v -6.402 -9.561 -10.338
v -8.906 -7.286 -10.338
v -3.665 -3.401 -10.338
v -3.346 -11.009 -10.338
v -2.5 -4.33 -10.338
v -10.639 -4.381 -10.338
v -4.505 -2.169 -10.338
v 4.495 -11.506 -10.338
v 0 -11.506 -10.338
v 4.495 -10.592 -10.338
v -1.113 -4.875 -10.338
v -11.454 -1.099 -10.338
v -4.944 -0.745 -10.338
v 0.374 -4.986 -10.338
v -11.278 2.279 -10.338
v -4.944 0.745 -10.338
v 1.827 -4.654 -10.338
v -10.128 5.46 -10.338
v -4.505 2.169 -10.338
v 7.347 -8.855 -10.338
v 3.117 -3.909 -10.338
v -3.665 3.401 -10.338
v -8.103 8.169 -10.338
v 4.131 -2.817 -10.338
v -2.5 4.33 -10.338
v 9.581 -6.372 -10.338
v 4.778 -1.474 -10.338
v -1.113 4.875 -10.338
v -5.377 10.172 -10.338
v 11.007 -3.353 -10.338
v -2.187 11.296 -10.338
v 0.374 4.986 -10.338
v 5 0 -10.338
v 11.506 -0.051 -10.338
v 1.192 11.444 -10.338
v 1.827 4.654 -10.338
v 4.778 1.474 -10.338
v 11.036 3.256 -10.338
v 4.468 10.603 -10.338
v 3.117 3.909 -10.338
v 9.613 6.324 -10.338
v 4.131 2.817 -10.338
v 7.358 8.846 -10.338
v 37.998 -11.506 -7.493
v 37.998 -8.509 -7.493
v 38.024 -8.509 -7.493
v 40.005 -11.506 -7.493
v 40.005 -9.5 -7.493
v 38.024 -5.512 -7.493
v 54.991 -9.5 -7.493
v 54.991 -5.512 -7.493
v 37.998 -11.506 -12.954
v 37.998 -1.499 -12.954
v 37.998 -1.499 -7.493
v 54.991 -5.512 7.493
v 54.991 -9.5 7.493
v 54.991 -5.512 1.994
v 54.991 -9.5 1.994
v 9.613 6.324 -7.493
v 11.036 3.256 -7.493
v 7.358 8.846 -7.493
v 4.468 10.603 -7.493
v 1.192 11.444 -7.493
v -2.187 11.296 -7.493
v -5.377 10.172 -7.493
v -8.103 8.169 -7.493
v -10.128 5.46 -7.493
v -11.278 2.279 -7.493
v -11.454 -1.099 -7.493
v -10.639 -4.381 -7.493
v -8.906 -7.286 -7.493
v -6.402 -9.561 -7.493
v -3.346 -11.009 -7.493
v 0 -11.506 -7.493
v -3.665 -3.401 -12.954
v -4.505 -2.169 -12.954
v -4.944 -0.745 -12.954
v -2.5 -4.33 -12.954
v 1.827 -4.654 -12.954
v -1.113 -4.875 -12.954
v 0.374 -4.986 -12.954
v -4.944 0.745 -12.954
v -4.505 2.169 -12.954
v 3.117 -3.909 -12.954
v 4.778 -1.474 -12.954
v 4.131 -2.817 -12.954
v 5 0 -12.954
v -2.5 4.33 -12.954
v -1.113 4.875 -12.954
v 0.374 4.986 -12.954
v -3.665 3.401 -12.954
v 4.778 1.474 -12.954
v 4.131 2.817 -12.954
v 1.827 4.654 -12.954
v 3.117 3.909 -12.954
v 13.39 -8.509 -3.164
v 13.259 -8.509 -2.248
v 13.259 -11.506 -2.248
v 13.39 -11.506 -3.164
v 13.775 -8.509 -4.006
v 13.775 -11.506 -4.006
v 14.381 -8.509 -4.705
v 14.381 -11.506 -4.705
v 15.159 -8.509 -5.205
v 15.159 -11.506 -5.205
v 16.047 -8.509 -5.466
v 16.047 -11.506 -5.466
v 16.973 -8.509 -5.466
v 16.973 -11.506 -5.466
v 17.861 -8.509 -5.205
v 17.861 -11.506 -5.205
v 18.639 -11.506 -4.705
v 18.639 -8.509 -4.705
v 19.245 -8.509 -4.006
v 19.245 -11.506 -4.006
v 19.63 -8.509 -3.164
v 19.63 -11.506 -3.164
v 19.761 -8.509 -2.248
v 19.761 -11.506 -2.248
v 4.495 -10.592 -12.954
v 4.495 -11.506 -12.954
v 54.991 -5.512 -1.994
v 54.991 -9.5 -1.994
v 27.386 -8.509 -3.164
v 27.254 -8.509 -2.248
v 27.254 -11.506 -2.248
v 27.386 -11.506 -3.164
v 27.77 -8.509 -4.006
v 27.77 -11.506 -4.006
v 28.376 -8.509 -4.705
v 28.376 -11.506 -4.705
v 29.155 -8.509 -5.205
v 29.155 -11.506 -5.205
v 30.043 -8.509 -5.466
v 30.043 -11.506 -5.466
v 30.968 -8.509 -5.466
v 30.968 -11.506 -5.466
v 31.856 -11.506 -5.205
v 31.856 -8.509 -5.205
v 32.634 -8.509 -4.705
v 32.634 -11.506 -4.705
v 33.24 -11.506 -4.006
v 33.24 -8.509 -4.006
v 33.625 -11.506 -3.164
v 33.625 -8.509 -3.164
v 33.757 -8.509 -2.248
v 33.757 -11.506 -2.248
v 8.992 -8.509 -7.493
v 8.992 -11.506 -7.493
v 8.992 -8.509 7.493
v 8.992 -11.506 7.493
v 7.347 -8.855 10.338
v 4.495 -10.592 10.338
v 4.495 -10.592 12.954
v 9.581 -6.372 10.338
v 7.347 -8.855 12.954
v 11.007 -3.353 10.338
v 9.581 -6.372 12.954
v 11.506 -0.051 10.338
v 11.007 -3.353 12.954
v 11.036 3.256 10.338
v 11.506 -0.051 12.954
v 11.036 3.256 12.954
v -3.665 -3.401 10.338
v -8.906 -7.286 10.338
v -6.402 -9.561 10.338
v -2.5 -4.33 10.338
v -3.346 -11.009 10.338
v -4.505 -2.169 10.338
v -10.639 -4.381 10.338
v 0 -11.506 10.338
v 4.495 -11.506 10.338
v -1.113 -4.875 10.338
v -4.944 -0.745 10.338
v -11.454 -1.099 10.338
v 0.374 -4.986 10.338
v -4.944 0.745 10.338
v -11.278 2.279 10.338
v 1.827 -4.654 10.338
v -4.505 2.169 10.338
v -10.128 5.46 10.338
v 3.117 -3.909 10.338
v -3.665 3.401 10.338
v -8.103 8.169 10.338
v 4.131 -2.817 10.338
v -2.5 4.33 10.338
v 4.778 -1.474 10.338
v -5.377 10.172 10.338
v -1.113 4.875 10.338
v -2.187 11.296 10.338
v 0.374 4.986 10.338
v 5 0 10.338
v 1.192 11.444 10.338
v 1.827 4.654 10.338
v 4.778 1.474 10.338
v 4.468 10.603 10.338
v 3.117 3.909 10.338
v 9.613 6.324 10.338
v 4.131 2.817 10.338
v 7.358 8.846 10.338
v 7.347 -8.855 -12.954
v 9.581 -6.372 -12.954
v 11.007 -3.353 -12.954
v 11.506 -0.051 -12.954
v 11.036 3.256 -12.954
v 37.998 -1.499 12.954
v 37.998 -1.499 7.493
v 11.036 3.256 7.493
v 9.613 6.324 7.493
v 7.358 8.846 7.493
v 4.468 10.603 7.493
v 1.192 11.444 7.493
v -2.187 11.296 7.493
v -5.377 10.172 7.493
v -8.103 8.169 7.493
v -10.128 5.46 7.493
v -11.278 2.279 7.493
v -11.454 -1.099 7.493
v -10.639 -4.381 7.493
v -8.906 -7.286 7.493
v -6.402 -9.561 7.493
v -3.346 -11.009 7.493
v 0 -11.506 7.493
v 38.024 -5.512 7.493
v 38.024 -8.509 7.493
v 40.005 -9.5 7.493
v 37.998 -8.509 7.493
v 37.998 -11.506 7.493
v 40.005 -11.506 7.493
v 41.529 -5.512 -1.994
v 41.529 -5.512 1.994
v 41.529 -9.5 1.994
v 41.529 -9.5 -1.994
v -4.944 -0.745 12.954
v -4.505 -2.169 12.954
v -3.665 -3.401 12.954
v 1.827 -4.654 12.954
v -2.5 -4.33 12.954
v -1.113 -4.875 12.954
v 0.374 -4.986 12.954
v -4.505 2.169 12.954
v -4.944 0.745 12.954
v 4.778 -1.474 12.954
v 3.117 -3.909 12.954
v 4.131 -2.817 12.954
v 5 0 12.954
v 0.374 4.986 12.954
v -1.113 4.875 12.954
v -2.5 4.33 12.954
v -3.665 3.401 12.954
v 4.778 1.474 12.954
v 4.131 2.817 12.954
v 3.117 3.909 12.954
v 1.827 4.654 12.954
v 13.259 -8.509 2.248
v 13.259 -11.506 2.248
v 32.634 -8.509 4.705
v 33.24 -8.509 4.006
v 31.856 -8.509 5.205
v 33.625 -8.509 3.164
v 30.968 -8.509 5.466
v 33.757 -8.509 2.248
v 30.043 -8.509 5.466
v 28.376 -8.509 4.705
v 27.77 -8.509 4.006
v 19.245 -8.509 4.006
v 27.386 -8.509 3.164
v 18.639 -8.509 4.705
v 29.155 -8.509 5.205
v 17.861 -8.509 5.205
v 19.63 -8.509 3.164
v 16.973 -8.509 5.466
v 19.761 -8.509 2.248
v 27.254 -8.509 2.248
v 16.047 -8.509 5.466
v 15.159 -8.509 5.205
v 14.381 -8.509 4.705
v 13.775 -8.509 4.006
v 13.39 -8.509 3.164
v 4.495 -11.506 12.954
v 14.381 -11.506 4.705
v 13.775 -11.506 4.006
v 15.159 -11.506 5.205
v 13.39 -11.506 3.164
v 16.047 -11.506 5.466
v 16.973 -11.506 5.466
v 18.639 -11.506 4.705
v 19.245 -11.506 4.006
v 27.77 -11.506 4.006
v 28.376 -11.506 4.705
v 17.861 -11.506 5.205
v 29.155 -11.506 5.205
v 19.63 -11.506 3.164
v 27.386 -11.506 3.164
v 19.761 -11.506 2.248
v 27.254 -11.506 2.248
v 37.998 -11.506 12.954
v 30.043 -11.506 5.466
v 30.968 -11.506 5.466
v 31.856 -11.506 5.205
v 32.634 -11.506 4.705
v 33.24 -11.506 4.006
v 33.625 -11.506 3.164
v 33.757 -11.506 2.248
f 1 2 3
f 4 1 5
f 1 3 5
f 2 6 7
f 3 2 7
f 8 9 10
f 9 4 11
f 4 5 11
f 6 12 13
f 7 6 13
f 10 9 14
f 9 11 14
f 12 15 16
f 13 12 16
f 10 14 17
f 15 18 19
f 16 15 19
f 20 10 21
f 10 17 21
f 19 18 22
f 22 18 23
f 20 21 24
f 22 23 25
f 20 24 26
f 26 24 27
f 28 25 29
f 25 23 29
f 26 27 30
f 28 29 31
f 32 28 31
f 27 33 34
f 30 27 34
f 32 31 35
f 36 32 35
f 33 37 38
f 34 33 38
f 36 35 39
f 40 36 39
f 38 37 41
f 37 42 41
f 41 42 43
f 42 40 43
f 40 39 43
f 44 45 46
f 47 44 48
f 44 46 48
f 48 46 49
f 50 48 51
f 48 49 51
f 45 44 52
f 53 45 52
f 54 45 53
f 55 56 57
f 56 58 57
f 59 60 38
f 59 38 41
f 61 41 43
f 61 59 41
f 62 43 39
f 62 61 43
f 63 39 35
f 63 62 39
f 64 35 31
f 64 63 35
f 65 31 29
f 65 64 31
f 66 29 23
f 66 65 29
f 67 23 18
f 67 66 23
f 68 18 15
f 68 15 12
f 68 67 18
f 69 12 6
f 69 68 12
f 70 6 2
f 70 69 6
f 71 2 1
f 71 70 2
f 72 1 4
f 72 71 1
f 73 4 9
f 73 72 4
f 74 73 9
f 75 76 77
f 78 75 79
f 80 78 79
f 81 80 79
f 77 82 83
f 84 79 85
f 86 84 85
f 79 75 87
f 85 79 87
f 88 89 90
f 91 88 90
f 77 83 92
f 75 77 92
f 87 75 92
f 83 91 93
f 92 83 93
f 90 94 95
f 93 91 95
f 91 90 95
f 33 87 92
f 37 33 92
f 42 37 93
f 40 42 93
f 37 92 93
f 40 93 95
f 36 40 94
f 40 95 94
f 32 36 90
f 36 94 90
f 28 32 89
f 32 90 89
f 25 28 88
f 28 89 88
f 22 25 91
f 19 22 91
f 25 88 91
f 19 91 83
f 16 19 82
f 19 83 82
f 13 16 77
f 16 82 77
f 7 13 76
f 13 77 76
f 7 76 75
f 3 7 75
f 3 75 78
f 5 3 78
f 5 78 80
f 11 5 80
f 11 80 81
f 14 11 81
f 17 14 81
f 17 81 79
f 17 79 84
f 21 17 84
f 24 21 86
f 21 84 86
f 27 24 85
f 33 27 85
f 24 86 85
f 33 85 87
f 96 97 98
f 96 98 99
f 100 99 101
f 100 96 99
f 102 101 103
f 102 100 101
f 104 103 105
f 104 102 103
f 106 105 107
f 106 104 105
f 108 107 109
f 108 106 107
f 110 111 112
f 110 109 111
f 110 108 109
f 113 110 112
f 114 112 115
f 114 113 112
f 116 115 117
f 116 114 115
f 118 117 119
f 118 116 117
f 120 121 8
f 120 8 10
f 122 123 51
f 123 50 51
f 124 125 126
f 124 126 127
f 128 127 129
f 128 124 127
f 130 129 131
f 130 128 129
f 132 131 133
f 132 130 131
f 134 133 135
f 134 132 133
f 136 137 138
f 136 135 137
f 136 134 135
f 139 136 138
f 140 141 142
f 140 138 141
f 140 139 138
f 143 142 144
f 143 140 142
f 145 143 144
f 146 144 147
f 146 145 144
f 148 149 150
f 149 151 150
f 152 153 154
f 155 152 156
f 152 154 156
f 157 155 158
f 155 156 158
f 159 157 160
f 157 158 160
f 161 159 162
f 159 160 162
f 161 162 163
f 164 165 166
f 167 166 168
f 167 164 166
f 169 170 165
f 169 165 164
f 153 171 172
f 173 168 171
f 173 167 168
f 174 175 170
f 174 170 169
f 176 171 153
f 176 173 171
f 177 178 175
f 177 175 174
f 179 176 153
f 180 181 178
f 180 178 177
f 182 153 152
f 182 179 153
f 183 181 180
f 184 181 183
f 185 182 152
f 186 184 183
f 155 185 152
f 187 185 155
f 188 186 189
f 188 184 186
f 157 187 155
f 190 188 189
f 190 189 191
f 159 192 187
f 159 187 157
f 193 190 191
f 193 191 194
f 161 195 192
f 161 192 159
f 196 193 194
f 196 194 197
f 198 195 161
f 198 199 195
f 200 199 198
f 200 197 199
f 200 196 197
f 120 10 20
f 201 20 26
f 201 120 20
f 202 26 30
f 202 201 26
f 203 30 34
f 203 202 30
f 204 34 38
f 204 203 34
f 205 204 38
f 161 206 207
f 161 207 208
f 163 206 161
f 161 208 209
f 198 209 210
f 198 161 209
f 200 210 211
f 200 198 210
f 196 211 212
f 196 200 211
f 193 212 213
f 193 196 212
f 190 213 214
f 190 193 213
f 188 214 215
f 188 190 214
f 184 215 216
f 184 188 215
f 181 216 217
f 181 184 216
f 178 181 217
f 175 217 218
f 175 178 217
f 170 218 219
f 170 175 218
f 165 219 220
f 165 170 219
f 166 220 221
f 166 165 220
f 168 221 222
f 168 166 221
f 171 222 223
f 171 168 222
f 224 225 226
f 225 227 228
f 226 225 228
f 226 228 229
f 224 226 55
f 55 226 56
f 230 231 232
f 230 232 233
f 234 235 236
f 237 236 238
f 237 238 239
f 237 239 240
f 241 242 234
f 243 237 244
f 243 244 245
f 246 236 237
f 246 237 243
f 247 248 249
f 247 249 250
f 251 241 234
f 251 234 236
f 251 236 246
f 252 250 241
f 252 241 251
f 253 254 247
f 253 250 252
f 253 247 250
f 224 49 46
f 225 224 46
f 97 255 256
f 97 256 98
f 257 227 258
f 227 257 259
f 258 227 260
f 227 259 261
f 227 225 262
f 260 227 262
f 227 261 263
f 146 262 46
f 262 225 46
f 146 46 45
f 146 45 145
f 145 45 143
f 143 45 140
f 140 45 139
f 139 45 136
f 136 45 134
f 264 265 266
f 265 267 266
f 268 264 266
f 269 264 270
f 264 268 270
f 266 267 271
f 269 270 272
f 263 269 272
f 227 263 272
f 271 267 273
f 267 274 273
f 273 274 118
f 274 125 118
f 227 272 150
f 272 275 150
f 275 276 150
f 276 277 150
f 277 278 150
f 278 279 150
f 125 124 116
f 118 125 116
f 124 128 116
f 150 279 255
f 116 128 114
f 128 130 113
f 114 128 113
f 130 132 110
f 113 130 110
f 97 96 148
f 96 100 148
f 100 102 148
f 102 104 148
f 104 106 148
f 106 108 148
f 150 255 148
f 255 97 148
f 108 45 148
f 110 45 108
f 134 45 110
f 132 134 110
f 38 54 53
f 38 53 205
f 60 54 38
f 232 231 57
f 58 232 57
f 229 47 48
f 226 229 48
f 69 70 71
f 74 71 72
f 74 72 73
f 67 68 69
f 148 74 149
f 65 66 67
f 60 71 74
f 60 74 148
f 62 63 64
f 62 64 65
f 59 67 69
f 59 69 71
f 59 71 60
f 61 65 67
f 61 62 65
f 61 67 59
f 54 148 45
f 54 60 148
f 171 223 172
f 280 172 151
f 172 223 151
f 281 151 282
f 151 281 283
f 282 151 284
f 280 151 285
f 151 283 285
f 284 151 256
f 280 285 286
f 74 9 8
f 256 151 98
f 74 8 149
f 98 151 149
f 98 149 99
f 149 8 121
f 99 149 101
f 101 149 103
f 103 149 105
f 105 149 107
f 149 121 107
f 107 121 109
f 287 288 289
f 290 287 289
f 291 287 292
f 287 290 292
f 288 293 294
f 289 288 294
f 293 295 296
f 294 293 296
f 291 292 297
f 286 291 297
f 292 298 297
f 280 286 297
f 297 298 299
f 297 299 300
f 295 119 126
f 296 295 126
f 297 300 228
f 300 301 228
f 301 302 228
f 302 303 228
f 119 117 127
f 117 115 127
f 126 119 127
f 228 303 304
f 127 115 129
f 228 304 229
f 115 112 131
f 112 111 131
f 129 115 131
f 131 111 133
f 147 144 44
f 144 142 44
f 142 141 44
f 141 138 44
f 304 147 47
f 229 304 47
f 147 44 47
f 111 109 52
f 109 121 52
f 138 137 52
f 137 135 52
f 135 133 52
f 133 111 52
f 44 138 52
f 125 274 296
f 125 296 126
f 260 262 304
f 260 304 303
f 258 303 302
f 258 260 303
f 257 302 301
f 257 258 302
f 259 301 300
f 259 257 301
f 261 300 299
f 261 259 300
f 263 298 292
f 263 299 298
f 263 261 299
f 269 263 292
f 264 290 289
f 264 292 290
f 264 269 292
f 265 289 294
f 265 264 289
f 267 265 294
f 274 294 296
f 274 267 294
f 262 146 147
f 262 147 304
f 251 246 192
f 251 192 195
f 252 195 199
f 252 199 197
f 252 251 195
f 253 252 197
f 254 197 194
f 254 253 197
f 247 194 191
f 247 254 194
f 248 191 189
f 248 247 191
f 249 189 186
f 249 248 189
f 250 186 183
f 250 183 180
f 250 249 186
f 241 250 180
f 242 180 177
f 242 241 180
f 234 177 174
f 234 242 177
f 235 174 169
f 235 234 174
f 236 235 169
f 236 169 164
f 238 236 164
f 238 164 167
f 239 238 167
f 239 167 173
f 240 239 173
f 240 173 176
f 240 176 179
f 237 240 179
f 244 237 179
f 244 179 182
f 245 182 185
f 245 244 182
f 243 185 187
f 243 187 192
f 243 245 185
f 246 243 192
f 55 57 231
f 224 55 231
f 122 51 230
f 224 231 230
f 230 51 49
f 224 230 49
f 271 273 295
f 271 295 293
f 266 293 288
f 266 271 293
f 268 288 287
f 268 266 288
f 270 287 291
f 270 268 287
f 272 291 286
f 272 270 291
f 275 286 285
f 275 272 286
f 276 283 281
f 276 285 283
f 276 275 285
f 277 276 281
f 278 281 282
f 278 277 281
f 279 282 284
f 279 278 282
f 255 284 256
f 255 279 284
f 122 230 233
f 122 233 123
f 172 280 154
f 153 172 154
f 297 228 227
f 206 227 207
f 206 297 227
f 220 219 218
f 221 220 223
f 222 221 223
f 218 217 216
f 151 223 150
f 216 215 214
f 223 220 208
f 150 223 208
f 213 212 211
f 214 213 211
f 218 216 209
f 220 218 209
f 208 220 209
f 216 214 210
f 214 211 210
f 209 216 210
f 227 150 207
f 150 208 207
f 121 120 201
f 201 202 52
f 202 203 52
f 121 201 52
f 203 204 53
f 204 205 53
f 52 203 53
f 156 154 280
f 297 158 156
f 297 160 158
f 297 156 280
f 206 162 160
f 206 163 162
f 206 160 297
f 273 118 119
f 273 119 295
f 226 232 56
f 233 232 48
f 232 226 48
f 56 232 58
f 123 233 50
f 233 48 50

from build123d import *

# Parameters (mm, degrees)
EXTRUDE1_DEPTH             = 12.954
SKETCH3_R                  = 5
CUT_EXTRUDE1_DEPTH         = 2.6162
CUT_EXTRUDE2_DEPTH         = 7.493
EXTRUDE2_REACH             = 14.954
EXTRUDE2_DIRECTION_2_REACH = 14.954
SKETCH7_W                  = 13.462
SKETCH7_H                  = 3.9878
CUT_EXTRUDE3_DEPTH         = 6.9944
CUT_EXTRUDE4_DEPTH         = 3.9972


with BuildPart() as part:
    # Sketch2 → Extrude1 (new body, symmetric)
    with BuildSketch(Plane.XY):
        with BuildLine():
            Line((37.9984, -11.5062), (37.9984, -1.4986))
            Line((37.9984, -1.4986), (11.036020087, 3.255595043))
            ThreePointArc((11.036020087, 3.255595043), (-9.215534877, 6.889597621), (0, -11.5062))
            Line((0, -11.5062), (37.9984, -11.5062))
        make_face()
    extrude(amount=EXTRUDE1_DEPTH, both=True)

    # Sketch3 → Cut-Extrude1 (cut)
    with BuildSketch(Plane.XY.offset(12.954)):
        with BuildLine():
            Line((0, -11.5062), (4.495154191, -11.5062))
            Line((4.495154191, -11.5062), (4.495154191, -10.5918))
            ThreePointArc((4.495154191, -10.5918), (-2.293607342, 11.27528287), (0, -11.5062))
        make_face()
        Circle(SKETCH3_R, mode=Mode.SUBTRACT)
    cut_extrude1 = extrude(amount=-CUT_EXTRUDE1_DEPTH, mode=Mode.SUBTRACT)

    # Mirror1: Cut-Extrude1 across plane
    add(cut_extrude1.mirror(Plane.XY), mode=Mode.SUBTRACT)

    # Sketch4 → Cut-Extrude2 (cut, symmetric)
    with BuildSketch(Plane.XY):
        with BuildLine():
            Line((8.9916, -8.509), (37.9984, -8.509))
            Line((37.9984, -8.509), (37.9984, -1.4986))
            Line((37.9984, -1.4986), (11.036020087, 3.255595043))
            ThreePointArc((11.036020087, 3.255595043), (-9.215534877, 6.889597621), (0, -11.5062))
            Line((0, -11.5062), (8.9916, -11.5062))
            Line((8.9916, -11.5062), (8.9916, -8.509))
        make_face()
    extrude(amount=CUT_EXTRUDE2_DEPTH, both=True, mode=Mode.SUBTRACT)

    # Extrude2: up to this face of the body (flat: up to its plane)
    extrude2_end = Plane(part.part.faces().sort_by_distance((8.815484891, -1.610467544, -7.493))[0])
    # Sketch5 → Extrude2 (add, up to the picked face)
    with BuildSketch(Plane.XY, mode=Mode.PRIVATE) as extrude2_sk1:
        Polygon((54.991, -5.5118), (38.0238, -5.5118), (38.0238, -8.509), (37.9984, -8.509), (37.9984, -11.5062), (40.005, -11.5062), (40.005, -9.4996), (54.991, -9.4996), align=None)
    extrude2_tool1 = split(extrude(extrude2_sk1.sketch, amount=-EXTRUDE2_REACH, mode=Mode.PRIVATE), bisect_by=extrude2_end, keep=Keep.BOTH, mode=Mode.PRIVATE)
    add(extrude2_tool1.solids().sort_by_distance((46.083002, -7.674508, 0))[0])

    # Extrude2 direction 2: up to this face of the body (flat: up to its plane)
    extrude2_direction_2_end = Plane(part.part.faces().sort_by_distance((8.815484891, -1.610467544, 7.493))[0])
    # Sketch5 → Extrude2 direction 2 (add, up to the picked face)
    with BuildSketch(Plane.XY, mode=Mode.PRIVATE) as extrude2_direction_2_sk1:
        Polygon((54.991, -5.5118), (38.0238, -5.5118), (38.0238, -8.509), (37.9984, -8.509), (37.9984, -11.5062), (40.005, -11.5062), (40.005, -9.4996), (54.991, -9.4996), align=None)
    extrude2_direction_2_tool1 = split(extrude(extrude2_direction_2_sk1.sketch, amount=EXTRUDE2_DIRECTION_2_REACH, mode=Mode.PRIVATE), bisect_by=extrude2_direction_2_end, keep=Keep.BOTH, mode=Mode.PRIVATE)
    add(extrude2_direction_2_tool1.solids().sort_by_distance((46.083002, -7.674508, 0))[0])

    # Sketch7 → Cut-Extrude3 (cut, through all)
    with BuildSketch(Plane(origin=(0, -5.5118, 0), x_dir=(1, 0, 0), z_dir=(0, 1, 0))):
        with Locations((48.26, 0)):
            Rectangle(SKETCH7_W, SKETCH7_H)
    extrude(amount=-CUT_EXTRUDE3_DEPTH, mode=Mode.SUBTRACT)

    # Sketch8 → Cut-Extrude4 (cut, through all)
    with BuildSketch(Plane(origin=(0, -8.509, 0), x_dir=(1, 0, 0), z_dir=(0, 1, 0))):
        with BuildLine():
            Line((19.7612, 2.2479), (19.7612, -2.2479))
            ThreePointArc((19.7612, -2.2479), (16.51, -5.4991), (13.2588, -2.2479))
            Line((13.2588, -2.2479), (13.2588, 2.2479))
            ThreePointArc((13.2588, 2.2479), (16.51, 5.4991), (19.7612, 2.2479))
        make_face()
        with BuildLine():
            Line((33.7566, 2.2479), (33.7566, -2.2479))
            ThreePointArc((33.7566, -2.2479), (30.5054, -5.4991), (27.2542, -2.2479))
            Line((27.2542, -2.2479), (27.2542, 2.2479))
            ThreePointArc((27.2542, 2.2479), (30.5054, 5.4991), (33.7566, 2.2479))
        make_face()
    extrude(amount=-CUT_EXTRUDE4_DEPTH, mode=Mode.SUBTRACT)


solid = part.part
